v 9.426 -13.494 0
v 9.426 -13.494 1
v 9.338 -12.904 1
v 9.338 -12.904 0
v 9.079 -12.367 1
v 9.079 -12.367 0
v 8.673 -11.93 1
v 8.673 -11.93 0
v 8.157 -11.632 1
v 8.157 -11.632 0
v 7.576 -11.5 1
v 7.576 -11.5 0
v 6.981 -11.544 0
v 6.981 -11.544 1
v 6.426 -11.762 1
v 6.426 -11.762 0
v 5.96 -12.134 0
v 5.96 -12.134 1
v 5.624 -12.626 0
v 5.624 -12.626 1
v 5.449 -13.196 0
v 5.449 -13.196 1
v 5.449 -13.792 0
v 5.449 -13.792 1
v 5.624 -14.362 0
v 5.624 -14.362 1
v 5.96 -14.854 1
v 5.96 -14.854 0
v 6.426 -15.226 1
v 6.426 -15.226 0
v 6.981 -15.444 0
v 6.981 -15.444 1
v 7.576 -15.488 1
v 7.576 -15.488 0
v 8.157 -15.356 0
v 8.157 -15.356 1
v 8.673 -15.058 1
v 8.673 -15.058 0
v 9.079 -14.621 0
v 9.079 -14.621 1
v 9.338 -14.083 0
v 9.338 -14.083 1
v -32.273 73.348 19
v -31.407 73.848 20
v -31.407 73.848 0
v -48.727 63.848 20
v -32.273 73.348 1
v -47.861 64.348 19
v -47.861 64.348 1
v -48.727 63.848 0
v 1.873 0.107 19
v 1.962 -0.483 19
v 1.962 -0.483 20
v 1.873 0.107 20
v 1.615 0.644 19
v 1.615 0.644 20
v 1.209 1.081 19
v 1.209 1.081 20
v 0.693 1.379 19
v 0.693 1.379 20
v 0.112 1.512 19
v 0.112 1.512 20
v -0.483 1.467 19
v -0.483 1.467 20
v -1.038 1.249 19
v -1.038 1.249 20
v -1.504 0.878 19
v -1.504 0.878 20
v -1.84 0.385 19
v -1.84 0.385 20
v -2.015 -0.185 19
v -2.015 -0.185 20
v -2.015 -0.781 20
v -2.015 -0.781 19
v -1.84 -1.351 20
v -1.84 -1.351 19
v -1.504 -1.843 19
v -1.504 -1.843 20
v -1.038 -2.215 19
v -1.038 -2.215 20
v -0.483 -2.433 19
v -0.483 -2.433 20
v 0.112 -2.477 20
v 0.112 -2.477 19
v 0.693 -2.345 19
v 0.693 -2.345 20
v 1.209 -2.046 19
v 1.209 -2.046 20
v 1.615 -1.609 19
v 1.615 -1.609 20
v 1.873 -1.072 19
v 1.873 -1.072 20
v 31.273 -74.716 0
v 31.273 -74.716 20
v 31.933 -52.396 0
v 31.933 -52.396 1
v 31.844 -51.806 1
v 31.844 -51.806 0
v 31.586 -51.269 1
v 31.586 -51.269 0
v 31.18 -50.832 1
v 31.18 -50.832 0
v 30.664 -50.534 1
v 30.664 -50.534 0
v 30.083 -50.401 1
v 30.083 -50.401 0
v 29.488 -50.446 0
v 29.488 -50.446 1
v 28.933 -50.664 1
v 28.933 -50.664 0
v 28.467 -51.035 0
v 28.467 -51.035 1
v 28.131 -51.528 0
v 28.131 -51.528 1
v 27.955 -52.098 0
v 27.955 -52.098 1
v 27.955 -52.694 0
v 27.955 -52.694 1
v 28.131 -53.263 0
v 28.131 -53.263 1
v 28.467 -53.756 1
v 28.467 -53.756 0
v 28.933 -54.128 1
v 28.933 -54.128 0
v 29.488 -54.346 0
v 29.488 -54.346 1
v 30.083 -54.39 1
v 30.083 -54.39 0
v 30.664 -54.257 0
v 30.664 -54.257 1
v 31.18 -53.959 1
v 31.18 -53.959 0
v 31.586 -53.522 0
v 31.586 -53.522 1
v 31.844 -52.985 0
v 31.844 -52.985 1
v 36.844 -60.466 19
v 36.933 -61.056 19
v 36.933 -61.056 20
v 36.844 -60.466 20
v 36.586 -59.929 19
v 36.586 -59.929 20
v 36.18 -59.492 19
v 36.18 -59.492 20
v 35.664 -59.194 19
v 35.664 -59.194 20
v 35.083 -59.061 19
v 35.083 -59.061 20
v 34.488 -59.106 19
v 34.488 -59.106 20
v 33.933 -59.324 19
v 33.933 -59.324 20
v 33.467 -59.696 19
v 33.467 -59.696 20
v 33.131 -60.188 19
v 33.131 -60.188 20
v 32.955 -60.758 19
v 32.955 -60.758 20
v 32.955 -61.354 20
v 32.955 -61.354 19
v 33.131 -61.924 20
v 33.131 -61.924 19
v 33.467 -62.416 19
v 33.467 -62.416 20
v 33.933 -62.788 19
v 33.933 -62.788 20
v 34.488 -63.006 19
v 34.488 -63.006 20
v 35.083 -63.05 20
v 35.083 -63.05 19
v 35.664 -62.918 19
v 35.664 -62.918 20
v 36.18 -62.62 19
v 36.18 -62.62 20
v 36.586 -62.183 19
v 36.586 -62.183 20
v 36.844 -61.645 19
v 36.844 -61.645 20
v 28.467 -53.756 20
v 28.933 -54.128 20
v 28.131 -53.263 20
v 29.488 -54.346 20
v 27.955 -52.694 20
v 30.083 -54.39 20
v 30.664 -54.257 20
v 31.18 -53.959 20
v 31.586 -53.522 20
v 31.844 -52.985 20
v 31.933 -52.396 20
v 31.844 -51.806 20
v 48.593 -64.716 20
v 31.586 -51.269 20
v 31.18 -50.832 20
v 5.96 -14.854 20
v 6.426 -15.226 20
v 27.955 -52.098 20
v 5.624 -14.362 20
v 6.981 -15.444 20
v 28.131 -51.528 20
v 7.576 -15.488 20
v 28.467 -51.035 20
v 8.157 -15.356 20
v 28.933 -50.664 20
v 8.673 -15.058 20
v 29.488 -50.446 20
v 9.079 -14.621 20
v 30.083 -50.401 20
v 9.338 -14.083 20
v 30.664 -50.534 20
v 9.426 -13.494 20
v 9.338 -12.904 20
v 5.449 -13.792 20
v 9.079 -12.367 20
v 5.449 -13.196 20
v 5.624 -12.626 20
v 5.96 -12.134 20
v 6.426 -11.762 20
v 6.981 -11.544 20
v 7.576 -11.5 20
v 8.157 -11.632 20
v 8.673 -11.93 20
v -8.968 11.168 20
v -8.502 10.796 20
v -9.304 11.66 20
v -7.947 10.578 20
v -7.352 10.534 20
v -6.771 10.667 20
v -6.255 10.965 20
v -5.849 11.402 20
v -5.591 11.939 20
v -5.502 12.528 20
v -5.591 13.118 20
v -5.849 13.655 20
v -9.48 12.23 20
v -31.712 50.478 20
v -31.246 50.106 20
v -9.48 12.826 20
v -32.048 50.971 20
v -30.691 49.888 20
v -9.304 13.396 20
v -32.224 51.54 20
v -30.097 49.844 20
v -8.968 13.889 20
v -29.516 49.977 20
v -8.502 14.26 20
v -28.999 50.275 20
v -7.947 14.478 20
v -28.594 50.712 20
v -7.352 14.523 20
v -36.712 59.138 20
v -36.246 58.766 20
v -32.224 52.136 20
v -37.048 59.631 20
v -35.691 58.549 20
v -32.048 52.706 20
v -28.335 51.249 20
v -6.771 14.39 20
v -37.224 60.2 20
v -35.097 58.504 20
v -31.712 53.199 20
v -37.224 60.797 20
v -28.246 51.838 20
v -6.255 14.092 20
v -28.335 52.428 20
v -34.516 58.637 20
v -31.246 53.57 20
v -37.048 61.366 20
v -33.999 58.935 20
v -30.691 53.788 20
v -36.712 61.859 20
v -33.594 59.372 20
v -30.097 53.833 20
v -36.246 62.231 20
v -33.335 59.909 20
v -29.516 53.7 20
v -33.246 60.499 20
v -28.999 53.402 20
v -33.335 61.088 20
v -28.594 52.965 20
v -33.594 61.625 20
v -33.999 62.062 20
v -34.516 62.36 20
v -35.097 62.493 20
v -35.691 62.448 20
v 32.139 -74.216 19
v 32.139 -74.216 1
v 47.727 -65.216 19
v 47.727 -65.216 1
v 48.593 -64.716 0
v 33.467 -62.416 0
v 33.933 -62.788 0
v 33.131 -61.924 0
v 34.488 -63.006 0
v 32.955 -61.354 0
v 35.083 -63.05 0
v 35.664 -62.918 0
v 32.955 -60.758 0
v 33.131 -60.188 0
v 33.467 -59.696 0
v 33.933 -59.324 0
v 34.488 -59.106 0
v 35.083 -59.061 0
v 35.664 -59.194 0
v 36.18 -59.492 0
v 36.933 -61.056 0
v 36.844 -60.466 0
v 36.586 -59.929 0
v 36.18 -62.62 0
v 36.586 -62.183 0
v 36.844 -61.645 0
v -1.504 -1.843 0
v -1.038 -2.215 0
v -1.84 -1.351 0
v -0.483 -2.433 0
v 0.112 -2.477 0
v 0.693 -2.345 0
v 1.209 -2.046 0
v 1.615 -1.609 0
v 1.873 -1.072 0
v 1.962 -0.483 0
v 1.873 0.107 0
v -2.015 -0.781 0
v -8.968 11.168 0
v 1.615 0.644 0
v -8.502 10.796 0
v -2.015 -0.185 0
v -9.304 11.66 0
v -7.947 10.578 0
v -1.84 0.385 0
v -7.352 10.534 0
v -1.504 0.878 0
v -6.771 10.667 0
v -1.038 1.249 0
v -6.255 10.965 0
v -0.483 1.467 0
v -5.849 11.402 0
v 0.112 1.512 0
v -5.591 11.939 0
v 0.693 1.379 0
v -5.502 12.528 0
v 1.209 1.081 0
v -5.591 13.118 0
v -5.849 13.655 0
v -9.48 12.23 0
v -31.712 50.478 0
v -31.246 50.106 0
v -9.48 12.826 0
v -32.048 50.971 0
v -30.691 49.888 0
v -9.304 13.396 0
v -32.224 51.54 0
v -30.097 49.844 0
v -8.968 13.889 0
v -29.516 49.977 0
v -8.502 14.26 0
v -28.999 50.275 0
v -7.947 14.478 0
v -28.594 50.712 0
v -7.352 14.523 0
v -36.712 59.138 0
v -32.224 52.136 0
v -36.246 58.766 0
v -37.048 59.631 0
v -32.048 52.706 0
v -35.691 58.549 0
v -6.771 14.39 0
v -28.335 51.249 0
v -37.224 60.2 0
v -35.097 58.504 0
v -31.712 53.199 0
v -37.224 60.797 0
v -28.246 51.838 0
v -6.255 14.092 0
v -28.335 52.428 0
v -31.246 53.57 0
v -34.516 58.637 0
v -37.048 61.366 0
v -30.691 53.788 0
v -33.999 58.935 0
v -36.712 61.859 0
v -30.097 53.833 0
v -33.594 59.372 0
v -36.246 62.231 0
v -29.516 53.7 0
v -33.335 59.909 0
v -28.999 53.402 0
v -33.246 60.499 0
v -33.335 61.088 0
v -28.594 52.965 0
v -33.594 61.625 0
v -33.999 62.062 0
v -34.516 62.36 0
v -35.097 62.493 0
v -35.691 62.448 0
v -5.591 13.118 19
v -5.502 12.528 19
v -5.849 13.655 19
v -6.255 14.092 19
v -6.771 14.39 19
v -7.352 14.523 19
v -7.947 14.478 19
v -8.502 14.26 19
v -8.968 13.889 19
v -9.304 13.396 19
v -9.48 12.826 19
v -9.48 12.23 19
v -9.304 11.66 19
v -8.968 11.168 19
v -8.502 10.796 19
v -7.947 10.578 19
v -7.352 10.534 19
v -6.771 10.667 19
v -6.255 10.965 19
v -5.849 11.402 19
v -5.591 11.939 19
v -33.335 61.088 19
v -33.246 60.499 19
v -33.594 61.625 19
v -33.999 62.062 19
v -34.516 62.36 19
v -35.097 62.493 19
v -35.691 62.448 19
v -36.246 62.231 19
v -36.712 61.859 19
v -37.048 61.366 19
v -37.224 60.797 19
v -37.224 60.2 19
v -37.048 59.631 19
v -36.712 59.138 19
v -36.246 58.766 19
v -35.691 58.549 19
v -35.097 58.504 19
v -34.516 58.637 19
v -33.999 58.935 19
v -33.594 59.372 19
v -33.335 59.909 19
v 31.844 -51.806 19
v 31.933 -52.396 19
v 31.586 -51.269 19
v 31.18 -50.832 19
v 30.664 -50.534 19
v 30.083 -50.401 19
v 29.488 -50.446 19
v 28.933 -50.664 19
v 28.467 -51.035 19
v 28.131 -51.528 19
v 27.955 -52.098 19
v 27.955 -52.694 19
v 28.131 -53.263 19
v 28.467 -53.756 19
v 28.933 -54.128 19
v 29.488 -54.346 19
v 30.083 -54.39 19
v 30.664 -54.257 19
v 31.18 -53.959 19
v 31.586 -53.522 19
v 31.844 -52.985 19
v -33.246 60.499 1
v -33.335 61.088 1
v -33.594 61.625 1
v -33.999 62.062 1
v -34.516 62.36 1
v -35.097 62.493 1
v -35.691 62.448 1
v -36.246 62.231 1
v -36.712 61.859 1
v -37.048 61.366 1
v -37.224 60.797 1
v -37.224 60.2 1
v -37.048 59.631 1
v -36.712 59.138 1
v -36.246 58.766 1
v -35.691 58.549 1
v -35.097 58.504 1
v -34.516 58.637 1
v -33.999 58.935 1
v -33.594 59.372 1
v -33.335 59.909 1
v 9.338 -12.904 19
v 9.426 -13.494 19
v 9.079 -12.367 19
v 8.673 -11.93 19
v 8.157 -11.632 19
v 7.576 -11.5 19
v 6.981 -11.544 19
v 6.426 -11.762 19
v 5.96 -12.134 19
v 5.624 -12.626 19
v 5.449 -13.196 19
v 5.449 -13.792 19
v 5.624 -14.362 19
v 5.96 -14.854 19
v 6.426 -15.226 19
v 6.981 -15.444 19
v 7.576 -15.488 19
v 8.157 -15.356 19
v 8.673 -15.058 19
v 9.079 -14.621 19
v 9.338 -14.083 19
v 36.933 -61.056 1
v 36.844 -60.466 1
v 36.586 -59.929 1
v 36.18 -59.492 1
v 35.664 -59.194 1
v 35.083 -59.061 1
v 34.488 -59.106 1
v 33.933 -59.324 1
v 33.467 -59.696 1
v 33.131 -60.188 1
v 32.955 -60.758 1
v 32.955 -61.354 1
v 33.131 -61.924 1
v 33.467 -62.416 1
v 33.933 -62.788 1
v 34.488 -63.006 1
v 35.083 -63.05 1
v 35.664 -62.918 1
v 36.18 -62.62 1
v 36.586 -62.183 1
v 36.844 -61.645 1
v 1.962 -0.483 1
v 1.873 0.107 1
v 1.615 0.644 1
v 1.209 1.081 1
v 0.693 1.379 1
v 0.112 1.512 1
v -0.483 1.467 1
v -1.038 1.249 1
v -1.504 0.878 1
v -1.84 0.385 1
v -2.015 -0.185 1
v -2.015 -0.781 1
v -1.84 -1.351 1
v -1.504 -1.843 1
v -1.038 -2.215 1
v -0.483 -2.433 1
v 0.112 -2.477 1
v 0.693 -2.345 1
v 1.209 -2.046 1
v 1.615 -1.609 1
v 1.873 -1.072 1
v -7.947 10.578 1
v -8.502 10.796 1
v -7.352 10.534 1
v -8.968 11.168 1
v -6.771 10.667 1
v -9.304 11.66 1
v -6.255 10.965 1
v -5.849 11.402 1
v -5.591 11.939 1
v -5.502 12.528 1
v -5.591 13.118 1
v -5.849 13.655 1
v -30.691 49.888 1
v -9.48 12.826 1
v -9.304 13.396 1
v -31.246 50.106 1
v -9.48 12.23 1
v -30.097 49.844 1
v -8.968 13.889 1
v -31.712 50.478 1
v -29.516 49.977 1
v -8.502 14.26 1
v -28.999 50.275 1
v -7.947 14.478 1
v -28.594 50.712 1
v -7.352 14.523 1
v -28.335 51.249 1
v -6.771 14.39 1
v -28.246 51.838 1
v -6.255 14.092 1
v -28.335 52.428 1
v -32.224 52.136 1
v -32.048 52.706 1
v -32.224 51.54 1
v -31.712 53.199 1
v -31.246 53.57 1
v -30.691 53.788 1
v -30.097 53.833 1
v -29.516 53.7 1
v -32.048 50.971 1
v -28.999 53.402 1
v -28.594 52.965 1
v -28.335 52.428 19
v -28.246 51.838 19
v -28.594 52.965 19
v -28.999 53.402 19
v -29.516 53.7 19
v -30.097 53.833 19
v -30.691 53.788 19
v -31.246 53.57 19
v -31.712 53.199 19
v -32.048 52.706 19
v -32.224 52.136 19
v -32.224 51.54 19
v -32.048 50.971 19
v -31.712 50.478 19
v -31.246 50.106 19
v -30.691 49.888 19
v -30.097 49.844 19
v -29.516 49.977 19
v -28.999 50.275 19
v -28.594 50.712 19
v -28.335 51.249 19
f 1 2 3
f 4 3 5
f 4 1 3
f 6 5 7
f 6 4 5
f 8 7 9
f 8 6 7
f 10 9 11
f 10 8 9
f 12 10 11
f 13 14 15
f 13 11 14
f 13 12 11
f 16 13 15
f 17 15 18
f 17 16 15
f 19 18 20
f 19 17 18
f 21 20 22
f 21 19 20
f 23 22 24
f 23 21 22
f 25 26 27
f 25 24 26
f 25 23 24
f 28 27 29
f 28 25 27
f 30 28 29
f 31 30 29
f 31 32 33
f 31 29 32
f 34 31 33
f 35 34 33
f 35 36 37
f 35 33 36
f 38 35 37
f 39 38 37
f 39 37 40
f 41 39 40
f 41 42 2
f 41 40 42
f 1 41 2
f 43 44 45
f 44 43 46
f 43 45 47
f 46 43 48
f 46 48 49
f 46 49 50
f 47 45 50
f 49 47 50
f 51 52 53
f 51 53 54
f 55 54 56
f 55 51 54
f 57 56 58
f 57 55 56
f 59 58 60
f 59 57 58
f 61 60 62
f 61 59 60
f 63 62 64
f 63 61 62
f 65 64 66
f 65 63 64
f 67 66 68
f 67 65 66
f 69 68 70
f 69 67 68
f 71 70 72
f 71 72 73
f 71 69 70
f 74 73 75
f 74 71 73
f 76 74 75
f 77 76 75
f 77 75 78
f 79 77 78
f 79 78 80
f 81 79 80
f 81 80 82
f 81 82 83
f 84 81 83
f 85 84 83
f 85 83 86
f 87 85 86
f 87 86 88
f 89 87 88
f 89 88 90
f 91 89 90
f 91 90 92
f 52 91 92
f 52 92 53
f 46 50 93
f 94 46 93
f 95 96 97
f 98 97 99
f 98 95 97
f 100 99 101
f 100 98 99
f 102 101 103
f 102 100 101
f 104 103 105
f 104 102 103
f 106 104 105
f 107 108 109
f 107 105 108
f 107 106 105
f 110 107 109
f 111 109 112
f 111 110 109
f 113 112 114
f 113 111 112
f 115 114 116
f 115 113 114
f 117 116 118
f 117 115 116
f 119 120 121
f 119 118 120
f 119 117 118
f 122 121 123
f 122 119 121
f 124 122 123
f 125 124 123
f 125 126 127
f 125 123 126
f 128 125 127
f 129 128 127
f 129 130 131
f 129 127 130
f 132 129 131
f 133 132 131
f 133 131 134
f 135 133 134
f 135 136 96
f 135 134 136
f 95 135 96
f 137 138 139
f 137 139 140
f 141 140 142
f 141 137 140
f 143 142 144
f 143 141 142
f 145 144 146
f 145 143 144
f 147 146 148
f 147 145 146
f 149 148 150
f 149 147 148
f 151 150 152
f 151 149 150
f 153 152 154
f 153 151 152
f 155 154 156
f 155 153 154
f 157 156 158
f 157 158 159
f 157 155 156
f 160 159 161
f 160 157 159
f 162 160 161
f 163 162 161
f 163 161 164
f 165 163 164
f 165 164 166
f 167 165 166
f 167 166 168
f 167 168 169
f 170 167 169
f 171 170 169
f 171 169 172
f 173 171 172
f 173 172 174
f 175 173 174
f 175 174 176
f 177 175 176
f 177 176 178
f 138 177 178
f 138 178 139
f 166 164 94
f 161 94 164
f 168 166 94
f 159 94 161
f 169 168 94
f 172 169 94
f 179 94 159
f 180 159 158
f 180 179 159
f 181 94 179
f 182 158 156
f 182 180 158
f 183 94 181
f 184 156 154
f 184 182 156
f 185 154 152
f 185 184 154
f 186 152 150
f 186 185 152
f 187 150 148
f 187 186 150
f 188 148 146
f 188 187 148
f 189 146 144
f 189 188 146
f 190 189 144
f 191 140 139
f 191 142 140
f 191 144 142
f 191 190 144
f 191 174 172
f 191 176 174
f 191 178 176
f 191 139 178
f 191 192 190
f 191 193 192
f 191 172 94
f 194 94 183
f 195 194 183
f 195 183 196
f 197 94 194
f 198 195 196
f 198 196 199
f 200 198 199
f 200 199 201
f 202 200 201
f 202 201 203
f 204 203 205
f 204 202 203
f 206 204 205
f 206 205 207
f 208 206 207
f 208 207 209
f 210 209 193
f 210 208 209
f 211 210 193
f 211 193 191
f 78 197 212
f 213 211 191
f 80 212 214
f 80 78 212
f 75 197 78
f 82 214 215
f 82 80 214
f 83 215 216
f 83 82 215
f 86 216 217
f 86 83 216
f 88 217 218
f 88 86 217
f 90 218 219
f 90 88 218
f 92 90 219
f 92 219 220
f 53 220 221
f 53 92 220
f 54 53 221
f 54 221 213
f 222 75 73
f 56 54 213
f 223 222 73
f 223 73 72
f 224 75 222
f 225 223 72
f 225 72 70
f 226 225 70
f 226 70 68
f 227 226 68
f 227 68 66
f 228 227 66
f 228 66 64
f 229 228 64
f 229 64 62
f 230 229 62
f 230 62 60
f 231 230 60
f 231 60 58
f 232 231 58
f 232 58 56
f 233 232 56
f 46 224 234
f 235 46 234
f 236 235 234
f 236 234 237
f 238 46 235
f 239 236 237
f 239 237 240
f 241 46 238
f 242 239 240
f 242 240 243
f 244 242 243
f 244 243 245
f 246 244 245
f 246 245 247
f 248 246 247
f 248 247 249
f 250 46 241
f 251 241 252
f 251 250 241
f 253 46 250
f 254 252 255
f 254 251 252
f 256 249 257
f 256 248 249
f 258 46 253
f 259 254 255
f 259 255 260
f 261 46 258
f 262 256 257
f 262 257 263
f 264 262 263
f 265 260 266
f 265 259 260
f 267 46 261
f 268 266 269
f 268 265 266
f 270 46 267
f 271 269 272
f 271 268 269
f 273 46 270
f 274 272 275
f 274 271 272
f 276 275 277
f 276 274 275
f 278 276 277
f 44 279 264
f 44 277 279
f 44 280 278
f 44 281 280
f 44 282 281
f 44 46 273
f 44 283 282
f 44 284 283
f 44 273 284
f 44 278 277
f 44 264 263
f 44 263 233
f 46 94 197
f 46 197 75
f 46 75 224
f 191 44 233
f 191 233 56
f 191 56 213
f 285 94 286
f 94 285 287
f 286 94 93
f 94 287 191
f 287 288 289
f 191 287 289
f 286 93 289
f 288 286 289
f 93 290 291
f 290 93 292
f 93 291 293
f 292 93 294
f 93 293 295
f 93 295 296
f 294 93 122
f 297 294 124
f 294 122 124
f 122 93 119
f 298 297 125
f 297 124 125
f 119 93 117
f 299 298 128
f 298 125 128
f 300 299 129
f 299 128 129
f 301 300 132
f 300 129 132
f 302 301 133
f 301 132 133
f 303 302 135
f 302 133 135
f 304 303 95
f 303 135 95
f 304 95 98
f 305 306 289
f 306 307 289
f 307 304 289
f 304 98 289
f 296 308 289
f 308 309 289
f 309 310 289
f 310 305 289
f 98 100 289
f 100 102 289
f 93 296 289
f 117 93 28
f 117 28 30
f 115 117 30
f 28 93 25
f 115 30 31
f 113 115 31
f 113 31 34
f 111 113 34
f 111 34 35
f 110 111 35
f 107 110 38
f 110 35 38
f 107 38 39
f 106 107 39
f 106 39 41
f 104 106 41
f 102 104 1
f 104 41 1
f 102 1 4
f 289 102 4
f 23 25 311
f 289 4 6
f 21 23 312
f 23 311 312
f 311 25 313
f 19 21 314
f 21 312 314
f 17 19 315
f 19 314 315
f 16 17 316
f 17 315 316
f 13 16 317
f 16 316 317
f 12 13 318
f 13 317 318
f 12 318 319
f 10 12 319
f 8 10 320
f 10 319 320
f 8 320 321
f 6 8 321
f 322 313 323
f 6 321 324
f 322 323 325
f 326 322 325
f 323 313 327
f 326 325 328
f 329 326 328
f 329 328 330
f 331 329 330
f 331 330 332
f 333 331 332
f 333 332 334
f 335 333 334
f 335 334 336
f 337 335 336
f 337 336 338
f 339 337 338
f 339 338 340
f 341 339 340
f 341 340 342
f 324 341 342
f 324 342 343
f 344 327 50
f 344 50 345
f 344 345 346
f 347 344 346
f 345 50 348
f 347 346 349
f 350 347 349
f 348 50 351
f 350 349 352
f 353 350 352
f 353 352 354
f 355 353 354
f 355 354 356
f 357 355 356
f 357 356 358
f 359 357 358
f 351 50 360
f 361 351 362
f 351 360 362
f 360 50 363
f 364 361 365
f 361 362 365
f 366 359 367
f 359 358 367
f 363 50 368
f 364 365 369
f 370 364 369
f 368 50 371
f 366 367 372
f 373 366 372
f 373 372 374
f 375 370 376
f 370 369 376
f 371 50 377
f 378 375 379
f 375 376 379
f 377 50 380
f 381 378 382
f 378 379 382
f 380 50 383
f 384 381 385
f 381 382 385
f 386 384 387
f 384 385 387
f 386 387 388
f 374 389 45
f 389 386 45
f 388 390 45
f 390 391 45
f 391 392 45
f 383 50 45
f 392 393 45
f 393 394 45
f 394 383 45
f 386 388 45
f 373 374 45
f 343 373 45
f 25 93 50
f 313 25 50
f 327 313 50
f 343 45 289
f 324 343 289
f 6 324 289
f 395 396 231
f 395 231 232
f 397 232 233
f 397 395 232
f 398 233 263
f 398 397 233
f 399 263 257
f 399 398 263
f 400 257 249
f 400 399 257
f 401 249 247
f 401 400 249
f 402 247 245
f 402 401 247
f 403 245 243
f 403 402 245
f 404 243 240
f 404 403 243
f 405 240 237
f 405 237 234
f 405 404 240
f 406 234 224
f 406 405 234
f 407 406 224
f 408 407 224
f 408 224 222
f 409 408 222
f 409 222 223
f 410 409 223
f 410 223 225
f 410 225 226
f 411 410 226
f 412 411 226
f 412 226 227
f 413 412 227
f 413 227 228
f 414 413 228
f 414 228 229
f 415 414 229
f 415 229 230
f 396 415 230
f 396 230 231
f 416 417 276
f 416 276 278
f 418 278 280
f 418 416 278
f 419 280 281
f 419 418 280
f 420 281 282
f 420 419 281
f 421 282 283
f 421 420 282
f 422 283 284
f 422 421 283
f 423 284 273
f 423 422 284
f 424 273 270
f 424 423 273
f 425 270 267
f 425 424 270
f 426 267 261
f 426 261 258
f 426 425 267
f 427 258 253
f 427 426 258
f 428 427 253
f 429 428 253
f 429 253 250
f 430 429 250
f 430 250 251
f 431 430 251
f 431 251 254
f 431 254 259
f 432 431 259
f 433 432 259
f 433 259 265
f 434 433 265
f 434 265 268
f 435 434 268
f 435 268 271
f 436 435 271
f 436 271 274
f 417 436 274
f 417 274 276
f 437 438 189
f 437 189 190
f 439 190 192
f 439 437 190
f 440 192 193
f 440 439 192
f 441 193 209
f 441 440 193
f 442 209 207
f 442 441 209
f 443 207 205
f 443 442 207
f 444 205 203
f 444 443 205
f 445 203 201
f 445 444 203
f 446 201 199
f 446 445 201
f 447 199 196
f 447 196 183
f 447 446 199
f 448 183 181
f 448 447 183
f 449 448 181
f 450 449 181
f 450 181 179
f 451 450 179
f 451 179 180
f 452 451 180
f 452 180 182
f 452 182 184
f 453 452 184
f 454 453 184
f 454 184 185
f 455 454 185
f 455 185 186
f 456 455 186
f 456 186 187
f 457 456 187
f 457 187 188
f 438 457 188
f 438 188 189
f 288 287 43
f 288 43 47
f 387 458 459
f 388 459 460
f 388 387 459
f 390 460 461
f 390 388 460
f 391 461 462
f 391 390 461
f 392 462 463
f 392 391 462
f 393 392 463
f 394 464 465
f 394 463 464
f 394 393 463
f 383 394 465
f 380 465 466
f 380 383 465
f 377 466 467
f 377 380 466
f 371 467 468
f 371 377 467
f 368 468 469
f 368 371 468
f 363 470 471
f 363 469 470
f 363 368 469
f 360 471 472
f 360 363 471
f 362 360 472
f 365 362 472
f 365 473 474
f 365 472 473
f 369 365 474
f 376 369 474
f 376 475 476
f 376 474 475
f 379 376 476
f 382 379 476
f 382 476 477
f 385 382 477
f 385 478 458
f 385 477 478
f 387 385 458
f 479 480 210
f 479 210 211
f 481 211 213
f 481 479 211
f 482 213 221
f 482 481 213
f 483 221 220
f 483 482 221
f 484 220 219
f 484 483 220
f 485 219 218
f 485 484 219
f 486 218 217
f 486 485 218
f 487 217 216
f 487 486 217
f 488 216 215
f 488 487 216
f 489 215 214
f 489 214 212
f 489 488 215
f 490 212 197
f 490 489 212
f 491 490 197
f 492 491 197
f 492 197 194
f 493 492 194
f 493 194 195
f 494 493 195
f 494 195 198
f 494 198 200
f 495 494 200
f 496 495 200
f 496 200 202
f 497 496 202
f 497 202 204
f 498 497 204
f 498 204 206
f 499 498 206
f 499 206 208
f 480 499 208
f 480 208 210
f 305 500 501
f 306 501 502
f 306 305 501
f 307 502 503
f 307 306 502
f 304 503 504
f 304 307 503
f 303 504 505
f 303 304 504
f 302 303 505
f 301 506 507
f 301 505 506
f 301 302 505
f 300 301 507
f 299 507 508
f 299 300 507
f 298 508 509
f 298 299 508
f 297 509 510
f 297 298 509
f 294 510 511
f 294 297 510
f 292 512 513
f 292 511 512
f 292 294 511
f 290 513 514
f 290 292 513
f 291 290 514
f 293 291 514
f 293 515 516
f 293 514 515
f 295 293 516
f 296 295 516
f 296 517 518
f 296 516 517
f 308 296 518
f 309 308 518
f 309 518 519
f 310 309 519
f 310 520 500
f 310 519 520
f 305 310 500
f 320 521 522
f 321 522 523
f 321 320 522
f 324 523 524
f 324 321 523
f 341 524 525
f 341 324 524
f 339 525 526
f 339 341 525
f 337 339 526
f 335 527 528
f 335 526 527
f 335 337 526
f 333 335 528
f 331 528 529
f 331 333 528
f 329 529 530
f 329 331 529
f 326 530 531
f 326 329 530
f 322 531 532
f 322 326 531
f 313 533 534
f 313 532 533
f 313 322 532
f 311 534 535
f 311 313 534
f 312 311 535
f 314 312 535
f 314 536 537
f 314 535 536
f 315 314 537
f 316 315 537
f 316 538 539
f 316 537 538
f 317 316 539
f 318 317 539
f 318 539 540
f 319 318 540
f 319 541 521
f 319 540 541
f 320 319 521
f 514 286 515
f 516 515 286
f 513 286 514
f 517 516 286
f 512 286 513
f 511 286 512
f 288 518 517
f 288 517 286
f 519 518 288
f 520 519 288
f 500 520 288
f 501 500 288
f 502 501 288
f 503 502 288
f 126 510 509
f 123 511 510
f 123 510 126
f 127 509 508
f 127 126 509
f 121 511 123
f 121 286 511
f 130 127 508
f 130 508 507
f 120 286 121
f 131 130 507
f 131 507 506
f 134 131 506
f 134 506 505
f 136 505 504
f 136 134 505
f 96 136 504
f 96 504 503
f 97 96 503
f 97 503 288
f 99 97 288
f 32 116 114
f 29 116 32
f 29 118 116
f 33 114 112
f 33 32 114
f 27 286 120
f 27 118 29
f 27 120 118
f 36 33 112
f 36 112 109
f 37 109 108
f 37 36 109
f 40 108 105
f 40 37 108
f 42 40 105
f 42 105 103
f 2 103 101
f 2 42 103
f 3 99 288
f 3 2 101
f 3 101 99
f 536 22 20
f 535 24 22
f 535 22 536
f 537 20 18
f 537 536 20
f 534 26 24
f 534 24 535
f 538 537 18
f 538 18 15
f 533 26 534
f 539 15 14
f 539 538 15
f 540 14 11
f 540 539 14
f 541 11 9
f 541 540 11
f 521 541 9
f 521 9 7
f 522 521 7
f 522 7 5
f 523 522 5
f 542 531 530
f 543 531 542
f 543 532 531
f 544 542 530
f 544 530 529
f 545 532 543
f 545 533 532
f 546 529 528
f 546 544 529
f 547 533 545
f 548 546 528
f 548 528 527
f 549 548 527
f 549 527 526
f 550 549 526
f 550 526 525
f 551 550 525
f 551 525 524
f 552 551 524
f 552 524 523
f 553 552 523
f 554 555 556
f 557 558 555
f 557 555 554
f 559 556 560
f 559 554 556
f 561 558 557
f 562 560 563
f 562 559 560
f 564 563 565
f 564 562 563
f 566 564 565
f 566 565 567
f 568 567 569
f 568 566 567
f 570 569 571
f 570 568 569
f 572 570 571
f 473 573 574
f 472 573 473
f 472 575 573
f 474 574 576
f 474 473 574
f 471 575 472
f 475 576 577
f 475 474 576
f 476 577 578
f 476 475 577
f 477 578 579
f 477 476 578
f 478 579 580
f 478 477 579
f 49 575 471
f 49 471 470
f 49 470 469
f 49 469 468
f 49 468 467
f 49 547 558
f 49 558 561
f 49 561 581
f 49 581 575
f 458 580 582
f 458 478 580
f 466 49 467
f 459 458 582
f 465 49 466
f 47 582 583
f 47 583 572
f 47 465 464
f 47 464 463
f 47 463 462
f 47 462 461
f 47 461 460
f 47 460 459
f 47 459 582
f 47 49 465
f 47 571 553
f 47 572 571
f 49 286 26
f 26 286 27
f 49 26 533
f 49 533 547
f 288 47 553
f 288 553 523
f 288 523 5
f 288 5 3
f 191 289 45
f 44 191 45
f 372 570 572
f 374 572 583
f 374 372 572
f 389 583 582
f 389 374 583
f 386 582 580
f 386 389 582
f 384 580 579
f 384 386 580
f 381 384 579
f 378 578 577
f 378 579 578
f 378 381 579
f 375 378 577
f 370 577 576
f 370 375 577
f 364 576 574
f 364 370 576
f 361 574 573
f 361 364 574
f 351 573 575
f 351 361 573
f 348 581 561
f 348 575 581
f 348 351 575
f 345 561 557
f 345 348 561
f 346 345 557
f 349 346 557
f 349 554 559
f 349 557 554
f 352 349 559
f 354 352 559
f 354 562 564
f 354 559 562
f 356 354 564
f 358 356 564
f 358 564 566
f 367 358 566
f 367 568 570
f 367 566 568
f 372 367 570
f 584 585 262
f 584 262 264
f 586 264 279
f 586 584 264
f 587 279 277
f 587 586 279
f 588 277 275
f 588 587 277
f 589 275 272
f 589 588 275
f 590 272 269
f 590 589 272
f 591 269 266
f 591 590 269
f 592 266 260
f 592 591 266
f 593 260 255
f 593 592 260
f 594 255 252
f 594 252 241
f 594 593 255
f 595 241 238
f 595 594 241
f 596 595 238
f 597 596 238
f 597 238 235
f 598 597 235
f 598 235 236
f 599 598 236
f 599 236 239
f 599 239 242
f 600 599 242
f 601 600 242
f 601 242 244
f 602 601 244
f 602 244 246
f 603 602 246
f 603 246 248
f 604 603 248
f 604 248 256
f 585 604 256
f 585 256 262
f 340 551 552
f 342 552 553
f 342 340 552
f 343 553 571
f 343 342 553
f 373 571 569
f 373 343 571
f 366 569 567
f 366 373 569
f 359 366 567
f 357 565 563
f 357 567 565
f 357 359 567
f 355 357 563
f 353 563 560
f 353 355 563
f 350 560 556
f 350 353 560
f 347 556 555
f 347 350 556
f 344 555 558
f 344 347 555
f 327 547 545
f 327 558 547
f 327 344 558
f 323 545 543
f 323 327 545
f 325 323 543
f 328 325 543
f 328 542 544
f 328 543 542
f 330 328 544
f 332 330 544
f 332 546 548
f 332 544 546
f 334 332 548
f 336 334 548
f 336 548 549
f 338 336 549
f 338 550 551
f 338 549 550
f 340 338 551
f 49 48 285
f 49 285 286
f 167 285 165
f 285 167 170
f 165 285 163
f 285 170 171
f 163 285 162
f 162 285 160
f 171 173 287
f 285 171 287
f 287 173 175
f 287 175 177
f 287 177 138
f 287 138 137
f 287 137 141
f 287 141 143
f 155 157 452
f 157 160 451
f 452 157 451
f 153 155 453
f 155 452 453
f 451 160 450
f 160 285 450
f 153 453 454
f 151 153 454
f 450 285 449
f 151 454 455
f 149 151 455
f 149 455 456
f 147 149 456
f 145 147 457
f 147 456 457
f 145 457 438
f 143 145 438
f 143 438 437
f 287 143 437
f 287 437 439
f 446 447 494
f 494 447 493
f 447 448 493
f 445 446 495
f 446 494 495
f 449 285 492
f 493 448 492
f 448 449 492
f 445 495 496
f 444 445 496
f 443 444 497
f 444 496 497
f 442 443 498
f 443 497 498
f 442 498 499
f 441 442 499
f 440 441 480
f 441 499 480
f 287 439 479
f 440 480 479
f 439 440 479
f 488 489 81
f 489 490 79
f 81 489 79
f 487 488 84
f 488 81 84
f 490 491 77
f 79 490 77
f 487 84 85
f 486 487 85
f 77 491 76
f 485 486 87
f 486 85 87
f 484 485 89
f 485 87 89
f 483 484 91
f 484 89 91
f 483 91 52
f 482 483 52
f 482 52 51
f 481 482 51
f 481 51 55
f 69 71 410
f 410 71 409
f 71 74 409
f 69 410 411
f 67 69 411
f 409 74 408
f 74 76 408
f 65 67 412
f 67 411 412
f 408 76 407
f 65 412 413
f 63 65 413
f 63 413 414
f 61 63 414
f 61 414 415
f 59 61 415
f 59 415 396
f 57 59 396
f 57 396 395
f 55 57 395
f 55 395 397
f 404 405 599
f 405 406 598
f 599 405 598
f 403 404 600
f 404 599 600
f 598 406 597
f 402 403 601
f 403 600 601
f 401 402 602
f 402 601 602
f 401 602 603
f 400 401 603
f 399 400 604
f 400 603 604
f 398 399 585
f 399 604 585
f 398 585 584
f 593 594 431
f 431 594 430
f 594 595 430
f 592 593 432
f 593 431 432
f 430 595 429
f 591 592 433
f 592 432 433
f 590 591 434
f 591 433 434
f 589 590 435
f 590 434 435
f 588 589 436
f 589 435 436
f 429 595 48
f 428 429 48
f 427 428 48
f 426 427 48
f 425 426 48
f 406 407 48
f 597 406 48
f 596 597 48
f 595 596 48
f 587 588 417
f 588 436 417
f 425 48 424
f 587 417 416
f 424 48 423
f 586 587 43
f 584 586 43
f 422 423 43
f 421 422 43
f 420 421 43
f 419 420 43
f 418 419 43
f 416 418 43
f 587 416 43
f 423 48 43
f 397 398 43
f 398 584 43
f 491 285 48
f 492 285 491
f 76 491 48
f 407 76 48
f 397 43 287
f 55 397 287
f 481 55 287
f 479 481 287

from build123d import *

# Parameters (mm, degrees)
SKETCH_1_R          = 2
EXTRUDE_1_DEPTH     = 20
SKETCH_2_W          = 18
SKETCH_2_H          = 18
CUT_EXTRUDE_1_DEPTH = 170.907643096


with BuildPart() as part:
    # 草图1 → 凸台-拉伸1 (new body)
    with BuildSketch(Plane.XY):
        Polygon((-48.727120284, 63.847904192), (31.272879716, -74.716160413), (48.593387792, -64.716160413), (-31.406612208, 73.847904192), align=None)
        with Locations((-35.246358171, 60.498539287)):
            Circle(SKETCH_1_R, mode=Mode.SUBTRACT)
        with Locations((-30.246358171, 51.838285249)):
            Circle(SKETCH_1_R, mode=Mode.SUBTRACT)
        with Locations((-7.501863714, 12.528261216)):
            Circle(SKETCH_1_R, mode=Mode.SUBTRACT)
        with Locations((-0.037744838, -0.482835818)):
            Circle(SKETCH_1_R, mode=Mode.SUBTRACT)
        with Locations((7.426374037, -13.493932851)):
            Circle(SKETCH_1_R, mode=Mode.SUBTRACT)
        with Locations((29.933133754, -52.395652337)):
            Circle(SKETCH_1_R, mode=Mode.SUBTRACT)
        with Locations((34.933133754, -61.055906375)):
            Circle(SKETCH_1_R, mode=Mode.SUBTRACT)
    extrude(amount=EXTRUDE_1_DEPTH)

    # 草图2 → 切除-拉伸1 (cut, through all)
    with BuildSketch(Plane(origin=(-39.828733576, 68.985390154, 0), x_dir=(0.8660254037844417, 0.4999999999999949, 0), z_dir=(-0.4999999999999949, 0.8660254037844417, 0))):
        with Locations((-0.274971923, -10)):
            Rectangle(SKETCH_2_W, SKETCH_2_H)
    extrude(amount=-CUT_EXTRUDE_1_DEPTH, mode=Mode.SUBTRACT)


solid = part.part
